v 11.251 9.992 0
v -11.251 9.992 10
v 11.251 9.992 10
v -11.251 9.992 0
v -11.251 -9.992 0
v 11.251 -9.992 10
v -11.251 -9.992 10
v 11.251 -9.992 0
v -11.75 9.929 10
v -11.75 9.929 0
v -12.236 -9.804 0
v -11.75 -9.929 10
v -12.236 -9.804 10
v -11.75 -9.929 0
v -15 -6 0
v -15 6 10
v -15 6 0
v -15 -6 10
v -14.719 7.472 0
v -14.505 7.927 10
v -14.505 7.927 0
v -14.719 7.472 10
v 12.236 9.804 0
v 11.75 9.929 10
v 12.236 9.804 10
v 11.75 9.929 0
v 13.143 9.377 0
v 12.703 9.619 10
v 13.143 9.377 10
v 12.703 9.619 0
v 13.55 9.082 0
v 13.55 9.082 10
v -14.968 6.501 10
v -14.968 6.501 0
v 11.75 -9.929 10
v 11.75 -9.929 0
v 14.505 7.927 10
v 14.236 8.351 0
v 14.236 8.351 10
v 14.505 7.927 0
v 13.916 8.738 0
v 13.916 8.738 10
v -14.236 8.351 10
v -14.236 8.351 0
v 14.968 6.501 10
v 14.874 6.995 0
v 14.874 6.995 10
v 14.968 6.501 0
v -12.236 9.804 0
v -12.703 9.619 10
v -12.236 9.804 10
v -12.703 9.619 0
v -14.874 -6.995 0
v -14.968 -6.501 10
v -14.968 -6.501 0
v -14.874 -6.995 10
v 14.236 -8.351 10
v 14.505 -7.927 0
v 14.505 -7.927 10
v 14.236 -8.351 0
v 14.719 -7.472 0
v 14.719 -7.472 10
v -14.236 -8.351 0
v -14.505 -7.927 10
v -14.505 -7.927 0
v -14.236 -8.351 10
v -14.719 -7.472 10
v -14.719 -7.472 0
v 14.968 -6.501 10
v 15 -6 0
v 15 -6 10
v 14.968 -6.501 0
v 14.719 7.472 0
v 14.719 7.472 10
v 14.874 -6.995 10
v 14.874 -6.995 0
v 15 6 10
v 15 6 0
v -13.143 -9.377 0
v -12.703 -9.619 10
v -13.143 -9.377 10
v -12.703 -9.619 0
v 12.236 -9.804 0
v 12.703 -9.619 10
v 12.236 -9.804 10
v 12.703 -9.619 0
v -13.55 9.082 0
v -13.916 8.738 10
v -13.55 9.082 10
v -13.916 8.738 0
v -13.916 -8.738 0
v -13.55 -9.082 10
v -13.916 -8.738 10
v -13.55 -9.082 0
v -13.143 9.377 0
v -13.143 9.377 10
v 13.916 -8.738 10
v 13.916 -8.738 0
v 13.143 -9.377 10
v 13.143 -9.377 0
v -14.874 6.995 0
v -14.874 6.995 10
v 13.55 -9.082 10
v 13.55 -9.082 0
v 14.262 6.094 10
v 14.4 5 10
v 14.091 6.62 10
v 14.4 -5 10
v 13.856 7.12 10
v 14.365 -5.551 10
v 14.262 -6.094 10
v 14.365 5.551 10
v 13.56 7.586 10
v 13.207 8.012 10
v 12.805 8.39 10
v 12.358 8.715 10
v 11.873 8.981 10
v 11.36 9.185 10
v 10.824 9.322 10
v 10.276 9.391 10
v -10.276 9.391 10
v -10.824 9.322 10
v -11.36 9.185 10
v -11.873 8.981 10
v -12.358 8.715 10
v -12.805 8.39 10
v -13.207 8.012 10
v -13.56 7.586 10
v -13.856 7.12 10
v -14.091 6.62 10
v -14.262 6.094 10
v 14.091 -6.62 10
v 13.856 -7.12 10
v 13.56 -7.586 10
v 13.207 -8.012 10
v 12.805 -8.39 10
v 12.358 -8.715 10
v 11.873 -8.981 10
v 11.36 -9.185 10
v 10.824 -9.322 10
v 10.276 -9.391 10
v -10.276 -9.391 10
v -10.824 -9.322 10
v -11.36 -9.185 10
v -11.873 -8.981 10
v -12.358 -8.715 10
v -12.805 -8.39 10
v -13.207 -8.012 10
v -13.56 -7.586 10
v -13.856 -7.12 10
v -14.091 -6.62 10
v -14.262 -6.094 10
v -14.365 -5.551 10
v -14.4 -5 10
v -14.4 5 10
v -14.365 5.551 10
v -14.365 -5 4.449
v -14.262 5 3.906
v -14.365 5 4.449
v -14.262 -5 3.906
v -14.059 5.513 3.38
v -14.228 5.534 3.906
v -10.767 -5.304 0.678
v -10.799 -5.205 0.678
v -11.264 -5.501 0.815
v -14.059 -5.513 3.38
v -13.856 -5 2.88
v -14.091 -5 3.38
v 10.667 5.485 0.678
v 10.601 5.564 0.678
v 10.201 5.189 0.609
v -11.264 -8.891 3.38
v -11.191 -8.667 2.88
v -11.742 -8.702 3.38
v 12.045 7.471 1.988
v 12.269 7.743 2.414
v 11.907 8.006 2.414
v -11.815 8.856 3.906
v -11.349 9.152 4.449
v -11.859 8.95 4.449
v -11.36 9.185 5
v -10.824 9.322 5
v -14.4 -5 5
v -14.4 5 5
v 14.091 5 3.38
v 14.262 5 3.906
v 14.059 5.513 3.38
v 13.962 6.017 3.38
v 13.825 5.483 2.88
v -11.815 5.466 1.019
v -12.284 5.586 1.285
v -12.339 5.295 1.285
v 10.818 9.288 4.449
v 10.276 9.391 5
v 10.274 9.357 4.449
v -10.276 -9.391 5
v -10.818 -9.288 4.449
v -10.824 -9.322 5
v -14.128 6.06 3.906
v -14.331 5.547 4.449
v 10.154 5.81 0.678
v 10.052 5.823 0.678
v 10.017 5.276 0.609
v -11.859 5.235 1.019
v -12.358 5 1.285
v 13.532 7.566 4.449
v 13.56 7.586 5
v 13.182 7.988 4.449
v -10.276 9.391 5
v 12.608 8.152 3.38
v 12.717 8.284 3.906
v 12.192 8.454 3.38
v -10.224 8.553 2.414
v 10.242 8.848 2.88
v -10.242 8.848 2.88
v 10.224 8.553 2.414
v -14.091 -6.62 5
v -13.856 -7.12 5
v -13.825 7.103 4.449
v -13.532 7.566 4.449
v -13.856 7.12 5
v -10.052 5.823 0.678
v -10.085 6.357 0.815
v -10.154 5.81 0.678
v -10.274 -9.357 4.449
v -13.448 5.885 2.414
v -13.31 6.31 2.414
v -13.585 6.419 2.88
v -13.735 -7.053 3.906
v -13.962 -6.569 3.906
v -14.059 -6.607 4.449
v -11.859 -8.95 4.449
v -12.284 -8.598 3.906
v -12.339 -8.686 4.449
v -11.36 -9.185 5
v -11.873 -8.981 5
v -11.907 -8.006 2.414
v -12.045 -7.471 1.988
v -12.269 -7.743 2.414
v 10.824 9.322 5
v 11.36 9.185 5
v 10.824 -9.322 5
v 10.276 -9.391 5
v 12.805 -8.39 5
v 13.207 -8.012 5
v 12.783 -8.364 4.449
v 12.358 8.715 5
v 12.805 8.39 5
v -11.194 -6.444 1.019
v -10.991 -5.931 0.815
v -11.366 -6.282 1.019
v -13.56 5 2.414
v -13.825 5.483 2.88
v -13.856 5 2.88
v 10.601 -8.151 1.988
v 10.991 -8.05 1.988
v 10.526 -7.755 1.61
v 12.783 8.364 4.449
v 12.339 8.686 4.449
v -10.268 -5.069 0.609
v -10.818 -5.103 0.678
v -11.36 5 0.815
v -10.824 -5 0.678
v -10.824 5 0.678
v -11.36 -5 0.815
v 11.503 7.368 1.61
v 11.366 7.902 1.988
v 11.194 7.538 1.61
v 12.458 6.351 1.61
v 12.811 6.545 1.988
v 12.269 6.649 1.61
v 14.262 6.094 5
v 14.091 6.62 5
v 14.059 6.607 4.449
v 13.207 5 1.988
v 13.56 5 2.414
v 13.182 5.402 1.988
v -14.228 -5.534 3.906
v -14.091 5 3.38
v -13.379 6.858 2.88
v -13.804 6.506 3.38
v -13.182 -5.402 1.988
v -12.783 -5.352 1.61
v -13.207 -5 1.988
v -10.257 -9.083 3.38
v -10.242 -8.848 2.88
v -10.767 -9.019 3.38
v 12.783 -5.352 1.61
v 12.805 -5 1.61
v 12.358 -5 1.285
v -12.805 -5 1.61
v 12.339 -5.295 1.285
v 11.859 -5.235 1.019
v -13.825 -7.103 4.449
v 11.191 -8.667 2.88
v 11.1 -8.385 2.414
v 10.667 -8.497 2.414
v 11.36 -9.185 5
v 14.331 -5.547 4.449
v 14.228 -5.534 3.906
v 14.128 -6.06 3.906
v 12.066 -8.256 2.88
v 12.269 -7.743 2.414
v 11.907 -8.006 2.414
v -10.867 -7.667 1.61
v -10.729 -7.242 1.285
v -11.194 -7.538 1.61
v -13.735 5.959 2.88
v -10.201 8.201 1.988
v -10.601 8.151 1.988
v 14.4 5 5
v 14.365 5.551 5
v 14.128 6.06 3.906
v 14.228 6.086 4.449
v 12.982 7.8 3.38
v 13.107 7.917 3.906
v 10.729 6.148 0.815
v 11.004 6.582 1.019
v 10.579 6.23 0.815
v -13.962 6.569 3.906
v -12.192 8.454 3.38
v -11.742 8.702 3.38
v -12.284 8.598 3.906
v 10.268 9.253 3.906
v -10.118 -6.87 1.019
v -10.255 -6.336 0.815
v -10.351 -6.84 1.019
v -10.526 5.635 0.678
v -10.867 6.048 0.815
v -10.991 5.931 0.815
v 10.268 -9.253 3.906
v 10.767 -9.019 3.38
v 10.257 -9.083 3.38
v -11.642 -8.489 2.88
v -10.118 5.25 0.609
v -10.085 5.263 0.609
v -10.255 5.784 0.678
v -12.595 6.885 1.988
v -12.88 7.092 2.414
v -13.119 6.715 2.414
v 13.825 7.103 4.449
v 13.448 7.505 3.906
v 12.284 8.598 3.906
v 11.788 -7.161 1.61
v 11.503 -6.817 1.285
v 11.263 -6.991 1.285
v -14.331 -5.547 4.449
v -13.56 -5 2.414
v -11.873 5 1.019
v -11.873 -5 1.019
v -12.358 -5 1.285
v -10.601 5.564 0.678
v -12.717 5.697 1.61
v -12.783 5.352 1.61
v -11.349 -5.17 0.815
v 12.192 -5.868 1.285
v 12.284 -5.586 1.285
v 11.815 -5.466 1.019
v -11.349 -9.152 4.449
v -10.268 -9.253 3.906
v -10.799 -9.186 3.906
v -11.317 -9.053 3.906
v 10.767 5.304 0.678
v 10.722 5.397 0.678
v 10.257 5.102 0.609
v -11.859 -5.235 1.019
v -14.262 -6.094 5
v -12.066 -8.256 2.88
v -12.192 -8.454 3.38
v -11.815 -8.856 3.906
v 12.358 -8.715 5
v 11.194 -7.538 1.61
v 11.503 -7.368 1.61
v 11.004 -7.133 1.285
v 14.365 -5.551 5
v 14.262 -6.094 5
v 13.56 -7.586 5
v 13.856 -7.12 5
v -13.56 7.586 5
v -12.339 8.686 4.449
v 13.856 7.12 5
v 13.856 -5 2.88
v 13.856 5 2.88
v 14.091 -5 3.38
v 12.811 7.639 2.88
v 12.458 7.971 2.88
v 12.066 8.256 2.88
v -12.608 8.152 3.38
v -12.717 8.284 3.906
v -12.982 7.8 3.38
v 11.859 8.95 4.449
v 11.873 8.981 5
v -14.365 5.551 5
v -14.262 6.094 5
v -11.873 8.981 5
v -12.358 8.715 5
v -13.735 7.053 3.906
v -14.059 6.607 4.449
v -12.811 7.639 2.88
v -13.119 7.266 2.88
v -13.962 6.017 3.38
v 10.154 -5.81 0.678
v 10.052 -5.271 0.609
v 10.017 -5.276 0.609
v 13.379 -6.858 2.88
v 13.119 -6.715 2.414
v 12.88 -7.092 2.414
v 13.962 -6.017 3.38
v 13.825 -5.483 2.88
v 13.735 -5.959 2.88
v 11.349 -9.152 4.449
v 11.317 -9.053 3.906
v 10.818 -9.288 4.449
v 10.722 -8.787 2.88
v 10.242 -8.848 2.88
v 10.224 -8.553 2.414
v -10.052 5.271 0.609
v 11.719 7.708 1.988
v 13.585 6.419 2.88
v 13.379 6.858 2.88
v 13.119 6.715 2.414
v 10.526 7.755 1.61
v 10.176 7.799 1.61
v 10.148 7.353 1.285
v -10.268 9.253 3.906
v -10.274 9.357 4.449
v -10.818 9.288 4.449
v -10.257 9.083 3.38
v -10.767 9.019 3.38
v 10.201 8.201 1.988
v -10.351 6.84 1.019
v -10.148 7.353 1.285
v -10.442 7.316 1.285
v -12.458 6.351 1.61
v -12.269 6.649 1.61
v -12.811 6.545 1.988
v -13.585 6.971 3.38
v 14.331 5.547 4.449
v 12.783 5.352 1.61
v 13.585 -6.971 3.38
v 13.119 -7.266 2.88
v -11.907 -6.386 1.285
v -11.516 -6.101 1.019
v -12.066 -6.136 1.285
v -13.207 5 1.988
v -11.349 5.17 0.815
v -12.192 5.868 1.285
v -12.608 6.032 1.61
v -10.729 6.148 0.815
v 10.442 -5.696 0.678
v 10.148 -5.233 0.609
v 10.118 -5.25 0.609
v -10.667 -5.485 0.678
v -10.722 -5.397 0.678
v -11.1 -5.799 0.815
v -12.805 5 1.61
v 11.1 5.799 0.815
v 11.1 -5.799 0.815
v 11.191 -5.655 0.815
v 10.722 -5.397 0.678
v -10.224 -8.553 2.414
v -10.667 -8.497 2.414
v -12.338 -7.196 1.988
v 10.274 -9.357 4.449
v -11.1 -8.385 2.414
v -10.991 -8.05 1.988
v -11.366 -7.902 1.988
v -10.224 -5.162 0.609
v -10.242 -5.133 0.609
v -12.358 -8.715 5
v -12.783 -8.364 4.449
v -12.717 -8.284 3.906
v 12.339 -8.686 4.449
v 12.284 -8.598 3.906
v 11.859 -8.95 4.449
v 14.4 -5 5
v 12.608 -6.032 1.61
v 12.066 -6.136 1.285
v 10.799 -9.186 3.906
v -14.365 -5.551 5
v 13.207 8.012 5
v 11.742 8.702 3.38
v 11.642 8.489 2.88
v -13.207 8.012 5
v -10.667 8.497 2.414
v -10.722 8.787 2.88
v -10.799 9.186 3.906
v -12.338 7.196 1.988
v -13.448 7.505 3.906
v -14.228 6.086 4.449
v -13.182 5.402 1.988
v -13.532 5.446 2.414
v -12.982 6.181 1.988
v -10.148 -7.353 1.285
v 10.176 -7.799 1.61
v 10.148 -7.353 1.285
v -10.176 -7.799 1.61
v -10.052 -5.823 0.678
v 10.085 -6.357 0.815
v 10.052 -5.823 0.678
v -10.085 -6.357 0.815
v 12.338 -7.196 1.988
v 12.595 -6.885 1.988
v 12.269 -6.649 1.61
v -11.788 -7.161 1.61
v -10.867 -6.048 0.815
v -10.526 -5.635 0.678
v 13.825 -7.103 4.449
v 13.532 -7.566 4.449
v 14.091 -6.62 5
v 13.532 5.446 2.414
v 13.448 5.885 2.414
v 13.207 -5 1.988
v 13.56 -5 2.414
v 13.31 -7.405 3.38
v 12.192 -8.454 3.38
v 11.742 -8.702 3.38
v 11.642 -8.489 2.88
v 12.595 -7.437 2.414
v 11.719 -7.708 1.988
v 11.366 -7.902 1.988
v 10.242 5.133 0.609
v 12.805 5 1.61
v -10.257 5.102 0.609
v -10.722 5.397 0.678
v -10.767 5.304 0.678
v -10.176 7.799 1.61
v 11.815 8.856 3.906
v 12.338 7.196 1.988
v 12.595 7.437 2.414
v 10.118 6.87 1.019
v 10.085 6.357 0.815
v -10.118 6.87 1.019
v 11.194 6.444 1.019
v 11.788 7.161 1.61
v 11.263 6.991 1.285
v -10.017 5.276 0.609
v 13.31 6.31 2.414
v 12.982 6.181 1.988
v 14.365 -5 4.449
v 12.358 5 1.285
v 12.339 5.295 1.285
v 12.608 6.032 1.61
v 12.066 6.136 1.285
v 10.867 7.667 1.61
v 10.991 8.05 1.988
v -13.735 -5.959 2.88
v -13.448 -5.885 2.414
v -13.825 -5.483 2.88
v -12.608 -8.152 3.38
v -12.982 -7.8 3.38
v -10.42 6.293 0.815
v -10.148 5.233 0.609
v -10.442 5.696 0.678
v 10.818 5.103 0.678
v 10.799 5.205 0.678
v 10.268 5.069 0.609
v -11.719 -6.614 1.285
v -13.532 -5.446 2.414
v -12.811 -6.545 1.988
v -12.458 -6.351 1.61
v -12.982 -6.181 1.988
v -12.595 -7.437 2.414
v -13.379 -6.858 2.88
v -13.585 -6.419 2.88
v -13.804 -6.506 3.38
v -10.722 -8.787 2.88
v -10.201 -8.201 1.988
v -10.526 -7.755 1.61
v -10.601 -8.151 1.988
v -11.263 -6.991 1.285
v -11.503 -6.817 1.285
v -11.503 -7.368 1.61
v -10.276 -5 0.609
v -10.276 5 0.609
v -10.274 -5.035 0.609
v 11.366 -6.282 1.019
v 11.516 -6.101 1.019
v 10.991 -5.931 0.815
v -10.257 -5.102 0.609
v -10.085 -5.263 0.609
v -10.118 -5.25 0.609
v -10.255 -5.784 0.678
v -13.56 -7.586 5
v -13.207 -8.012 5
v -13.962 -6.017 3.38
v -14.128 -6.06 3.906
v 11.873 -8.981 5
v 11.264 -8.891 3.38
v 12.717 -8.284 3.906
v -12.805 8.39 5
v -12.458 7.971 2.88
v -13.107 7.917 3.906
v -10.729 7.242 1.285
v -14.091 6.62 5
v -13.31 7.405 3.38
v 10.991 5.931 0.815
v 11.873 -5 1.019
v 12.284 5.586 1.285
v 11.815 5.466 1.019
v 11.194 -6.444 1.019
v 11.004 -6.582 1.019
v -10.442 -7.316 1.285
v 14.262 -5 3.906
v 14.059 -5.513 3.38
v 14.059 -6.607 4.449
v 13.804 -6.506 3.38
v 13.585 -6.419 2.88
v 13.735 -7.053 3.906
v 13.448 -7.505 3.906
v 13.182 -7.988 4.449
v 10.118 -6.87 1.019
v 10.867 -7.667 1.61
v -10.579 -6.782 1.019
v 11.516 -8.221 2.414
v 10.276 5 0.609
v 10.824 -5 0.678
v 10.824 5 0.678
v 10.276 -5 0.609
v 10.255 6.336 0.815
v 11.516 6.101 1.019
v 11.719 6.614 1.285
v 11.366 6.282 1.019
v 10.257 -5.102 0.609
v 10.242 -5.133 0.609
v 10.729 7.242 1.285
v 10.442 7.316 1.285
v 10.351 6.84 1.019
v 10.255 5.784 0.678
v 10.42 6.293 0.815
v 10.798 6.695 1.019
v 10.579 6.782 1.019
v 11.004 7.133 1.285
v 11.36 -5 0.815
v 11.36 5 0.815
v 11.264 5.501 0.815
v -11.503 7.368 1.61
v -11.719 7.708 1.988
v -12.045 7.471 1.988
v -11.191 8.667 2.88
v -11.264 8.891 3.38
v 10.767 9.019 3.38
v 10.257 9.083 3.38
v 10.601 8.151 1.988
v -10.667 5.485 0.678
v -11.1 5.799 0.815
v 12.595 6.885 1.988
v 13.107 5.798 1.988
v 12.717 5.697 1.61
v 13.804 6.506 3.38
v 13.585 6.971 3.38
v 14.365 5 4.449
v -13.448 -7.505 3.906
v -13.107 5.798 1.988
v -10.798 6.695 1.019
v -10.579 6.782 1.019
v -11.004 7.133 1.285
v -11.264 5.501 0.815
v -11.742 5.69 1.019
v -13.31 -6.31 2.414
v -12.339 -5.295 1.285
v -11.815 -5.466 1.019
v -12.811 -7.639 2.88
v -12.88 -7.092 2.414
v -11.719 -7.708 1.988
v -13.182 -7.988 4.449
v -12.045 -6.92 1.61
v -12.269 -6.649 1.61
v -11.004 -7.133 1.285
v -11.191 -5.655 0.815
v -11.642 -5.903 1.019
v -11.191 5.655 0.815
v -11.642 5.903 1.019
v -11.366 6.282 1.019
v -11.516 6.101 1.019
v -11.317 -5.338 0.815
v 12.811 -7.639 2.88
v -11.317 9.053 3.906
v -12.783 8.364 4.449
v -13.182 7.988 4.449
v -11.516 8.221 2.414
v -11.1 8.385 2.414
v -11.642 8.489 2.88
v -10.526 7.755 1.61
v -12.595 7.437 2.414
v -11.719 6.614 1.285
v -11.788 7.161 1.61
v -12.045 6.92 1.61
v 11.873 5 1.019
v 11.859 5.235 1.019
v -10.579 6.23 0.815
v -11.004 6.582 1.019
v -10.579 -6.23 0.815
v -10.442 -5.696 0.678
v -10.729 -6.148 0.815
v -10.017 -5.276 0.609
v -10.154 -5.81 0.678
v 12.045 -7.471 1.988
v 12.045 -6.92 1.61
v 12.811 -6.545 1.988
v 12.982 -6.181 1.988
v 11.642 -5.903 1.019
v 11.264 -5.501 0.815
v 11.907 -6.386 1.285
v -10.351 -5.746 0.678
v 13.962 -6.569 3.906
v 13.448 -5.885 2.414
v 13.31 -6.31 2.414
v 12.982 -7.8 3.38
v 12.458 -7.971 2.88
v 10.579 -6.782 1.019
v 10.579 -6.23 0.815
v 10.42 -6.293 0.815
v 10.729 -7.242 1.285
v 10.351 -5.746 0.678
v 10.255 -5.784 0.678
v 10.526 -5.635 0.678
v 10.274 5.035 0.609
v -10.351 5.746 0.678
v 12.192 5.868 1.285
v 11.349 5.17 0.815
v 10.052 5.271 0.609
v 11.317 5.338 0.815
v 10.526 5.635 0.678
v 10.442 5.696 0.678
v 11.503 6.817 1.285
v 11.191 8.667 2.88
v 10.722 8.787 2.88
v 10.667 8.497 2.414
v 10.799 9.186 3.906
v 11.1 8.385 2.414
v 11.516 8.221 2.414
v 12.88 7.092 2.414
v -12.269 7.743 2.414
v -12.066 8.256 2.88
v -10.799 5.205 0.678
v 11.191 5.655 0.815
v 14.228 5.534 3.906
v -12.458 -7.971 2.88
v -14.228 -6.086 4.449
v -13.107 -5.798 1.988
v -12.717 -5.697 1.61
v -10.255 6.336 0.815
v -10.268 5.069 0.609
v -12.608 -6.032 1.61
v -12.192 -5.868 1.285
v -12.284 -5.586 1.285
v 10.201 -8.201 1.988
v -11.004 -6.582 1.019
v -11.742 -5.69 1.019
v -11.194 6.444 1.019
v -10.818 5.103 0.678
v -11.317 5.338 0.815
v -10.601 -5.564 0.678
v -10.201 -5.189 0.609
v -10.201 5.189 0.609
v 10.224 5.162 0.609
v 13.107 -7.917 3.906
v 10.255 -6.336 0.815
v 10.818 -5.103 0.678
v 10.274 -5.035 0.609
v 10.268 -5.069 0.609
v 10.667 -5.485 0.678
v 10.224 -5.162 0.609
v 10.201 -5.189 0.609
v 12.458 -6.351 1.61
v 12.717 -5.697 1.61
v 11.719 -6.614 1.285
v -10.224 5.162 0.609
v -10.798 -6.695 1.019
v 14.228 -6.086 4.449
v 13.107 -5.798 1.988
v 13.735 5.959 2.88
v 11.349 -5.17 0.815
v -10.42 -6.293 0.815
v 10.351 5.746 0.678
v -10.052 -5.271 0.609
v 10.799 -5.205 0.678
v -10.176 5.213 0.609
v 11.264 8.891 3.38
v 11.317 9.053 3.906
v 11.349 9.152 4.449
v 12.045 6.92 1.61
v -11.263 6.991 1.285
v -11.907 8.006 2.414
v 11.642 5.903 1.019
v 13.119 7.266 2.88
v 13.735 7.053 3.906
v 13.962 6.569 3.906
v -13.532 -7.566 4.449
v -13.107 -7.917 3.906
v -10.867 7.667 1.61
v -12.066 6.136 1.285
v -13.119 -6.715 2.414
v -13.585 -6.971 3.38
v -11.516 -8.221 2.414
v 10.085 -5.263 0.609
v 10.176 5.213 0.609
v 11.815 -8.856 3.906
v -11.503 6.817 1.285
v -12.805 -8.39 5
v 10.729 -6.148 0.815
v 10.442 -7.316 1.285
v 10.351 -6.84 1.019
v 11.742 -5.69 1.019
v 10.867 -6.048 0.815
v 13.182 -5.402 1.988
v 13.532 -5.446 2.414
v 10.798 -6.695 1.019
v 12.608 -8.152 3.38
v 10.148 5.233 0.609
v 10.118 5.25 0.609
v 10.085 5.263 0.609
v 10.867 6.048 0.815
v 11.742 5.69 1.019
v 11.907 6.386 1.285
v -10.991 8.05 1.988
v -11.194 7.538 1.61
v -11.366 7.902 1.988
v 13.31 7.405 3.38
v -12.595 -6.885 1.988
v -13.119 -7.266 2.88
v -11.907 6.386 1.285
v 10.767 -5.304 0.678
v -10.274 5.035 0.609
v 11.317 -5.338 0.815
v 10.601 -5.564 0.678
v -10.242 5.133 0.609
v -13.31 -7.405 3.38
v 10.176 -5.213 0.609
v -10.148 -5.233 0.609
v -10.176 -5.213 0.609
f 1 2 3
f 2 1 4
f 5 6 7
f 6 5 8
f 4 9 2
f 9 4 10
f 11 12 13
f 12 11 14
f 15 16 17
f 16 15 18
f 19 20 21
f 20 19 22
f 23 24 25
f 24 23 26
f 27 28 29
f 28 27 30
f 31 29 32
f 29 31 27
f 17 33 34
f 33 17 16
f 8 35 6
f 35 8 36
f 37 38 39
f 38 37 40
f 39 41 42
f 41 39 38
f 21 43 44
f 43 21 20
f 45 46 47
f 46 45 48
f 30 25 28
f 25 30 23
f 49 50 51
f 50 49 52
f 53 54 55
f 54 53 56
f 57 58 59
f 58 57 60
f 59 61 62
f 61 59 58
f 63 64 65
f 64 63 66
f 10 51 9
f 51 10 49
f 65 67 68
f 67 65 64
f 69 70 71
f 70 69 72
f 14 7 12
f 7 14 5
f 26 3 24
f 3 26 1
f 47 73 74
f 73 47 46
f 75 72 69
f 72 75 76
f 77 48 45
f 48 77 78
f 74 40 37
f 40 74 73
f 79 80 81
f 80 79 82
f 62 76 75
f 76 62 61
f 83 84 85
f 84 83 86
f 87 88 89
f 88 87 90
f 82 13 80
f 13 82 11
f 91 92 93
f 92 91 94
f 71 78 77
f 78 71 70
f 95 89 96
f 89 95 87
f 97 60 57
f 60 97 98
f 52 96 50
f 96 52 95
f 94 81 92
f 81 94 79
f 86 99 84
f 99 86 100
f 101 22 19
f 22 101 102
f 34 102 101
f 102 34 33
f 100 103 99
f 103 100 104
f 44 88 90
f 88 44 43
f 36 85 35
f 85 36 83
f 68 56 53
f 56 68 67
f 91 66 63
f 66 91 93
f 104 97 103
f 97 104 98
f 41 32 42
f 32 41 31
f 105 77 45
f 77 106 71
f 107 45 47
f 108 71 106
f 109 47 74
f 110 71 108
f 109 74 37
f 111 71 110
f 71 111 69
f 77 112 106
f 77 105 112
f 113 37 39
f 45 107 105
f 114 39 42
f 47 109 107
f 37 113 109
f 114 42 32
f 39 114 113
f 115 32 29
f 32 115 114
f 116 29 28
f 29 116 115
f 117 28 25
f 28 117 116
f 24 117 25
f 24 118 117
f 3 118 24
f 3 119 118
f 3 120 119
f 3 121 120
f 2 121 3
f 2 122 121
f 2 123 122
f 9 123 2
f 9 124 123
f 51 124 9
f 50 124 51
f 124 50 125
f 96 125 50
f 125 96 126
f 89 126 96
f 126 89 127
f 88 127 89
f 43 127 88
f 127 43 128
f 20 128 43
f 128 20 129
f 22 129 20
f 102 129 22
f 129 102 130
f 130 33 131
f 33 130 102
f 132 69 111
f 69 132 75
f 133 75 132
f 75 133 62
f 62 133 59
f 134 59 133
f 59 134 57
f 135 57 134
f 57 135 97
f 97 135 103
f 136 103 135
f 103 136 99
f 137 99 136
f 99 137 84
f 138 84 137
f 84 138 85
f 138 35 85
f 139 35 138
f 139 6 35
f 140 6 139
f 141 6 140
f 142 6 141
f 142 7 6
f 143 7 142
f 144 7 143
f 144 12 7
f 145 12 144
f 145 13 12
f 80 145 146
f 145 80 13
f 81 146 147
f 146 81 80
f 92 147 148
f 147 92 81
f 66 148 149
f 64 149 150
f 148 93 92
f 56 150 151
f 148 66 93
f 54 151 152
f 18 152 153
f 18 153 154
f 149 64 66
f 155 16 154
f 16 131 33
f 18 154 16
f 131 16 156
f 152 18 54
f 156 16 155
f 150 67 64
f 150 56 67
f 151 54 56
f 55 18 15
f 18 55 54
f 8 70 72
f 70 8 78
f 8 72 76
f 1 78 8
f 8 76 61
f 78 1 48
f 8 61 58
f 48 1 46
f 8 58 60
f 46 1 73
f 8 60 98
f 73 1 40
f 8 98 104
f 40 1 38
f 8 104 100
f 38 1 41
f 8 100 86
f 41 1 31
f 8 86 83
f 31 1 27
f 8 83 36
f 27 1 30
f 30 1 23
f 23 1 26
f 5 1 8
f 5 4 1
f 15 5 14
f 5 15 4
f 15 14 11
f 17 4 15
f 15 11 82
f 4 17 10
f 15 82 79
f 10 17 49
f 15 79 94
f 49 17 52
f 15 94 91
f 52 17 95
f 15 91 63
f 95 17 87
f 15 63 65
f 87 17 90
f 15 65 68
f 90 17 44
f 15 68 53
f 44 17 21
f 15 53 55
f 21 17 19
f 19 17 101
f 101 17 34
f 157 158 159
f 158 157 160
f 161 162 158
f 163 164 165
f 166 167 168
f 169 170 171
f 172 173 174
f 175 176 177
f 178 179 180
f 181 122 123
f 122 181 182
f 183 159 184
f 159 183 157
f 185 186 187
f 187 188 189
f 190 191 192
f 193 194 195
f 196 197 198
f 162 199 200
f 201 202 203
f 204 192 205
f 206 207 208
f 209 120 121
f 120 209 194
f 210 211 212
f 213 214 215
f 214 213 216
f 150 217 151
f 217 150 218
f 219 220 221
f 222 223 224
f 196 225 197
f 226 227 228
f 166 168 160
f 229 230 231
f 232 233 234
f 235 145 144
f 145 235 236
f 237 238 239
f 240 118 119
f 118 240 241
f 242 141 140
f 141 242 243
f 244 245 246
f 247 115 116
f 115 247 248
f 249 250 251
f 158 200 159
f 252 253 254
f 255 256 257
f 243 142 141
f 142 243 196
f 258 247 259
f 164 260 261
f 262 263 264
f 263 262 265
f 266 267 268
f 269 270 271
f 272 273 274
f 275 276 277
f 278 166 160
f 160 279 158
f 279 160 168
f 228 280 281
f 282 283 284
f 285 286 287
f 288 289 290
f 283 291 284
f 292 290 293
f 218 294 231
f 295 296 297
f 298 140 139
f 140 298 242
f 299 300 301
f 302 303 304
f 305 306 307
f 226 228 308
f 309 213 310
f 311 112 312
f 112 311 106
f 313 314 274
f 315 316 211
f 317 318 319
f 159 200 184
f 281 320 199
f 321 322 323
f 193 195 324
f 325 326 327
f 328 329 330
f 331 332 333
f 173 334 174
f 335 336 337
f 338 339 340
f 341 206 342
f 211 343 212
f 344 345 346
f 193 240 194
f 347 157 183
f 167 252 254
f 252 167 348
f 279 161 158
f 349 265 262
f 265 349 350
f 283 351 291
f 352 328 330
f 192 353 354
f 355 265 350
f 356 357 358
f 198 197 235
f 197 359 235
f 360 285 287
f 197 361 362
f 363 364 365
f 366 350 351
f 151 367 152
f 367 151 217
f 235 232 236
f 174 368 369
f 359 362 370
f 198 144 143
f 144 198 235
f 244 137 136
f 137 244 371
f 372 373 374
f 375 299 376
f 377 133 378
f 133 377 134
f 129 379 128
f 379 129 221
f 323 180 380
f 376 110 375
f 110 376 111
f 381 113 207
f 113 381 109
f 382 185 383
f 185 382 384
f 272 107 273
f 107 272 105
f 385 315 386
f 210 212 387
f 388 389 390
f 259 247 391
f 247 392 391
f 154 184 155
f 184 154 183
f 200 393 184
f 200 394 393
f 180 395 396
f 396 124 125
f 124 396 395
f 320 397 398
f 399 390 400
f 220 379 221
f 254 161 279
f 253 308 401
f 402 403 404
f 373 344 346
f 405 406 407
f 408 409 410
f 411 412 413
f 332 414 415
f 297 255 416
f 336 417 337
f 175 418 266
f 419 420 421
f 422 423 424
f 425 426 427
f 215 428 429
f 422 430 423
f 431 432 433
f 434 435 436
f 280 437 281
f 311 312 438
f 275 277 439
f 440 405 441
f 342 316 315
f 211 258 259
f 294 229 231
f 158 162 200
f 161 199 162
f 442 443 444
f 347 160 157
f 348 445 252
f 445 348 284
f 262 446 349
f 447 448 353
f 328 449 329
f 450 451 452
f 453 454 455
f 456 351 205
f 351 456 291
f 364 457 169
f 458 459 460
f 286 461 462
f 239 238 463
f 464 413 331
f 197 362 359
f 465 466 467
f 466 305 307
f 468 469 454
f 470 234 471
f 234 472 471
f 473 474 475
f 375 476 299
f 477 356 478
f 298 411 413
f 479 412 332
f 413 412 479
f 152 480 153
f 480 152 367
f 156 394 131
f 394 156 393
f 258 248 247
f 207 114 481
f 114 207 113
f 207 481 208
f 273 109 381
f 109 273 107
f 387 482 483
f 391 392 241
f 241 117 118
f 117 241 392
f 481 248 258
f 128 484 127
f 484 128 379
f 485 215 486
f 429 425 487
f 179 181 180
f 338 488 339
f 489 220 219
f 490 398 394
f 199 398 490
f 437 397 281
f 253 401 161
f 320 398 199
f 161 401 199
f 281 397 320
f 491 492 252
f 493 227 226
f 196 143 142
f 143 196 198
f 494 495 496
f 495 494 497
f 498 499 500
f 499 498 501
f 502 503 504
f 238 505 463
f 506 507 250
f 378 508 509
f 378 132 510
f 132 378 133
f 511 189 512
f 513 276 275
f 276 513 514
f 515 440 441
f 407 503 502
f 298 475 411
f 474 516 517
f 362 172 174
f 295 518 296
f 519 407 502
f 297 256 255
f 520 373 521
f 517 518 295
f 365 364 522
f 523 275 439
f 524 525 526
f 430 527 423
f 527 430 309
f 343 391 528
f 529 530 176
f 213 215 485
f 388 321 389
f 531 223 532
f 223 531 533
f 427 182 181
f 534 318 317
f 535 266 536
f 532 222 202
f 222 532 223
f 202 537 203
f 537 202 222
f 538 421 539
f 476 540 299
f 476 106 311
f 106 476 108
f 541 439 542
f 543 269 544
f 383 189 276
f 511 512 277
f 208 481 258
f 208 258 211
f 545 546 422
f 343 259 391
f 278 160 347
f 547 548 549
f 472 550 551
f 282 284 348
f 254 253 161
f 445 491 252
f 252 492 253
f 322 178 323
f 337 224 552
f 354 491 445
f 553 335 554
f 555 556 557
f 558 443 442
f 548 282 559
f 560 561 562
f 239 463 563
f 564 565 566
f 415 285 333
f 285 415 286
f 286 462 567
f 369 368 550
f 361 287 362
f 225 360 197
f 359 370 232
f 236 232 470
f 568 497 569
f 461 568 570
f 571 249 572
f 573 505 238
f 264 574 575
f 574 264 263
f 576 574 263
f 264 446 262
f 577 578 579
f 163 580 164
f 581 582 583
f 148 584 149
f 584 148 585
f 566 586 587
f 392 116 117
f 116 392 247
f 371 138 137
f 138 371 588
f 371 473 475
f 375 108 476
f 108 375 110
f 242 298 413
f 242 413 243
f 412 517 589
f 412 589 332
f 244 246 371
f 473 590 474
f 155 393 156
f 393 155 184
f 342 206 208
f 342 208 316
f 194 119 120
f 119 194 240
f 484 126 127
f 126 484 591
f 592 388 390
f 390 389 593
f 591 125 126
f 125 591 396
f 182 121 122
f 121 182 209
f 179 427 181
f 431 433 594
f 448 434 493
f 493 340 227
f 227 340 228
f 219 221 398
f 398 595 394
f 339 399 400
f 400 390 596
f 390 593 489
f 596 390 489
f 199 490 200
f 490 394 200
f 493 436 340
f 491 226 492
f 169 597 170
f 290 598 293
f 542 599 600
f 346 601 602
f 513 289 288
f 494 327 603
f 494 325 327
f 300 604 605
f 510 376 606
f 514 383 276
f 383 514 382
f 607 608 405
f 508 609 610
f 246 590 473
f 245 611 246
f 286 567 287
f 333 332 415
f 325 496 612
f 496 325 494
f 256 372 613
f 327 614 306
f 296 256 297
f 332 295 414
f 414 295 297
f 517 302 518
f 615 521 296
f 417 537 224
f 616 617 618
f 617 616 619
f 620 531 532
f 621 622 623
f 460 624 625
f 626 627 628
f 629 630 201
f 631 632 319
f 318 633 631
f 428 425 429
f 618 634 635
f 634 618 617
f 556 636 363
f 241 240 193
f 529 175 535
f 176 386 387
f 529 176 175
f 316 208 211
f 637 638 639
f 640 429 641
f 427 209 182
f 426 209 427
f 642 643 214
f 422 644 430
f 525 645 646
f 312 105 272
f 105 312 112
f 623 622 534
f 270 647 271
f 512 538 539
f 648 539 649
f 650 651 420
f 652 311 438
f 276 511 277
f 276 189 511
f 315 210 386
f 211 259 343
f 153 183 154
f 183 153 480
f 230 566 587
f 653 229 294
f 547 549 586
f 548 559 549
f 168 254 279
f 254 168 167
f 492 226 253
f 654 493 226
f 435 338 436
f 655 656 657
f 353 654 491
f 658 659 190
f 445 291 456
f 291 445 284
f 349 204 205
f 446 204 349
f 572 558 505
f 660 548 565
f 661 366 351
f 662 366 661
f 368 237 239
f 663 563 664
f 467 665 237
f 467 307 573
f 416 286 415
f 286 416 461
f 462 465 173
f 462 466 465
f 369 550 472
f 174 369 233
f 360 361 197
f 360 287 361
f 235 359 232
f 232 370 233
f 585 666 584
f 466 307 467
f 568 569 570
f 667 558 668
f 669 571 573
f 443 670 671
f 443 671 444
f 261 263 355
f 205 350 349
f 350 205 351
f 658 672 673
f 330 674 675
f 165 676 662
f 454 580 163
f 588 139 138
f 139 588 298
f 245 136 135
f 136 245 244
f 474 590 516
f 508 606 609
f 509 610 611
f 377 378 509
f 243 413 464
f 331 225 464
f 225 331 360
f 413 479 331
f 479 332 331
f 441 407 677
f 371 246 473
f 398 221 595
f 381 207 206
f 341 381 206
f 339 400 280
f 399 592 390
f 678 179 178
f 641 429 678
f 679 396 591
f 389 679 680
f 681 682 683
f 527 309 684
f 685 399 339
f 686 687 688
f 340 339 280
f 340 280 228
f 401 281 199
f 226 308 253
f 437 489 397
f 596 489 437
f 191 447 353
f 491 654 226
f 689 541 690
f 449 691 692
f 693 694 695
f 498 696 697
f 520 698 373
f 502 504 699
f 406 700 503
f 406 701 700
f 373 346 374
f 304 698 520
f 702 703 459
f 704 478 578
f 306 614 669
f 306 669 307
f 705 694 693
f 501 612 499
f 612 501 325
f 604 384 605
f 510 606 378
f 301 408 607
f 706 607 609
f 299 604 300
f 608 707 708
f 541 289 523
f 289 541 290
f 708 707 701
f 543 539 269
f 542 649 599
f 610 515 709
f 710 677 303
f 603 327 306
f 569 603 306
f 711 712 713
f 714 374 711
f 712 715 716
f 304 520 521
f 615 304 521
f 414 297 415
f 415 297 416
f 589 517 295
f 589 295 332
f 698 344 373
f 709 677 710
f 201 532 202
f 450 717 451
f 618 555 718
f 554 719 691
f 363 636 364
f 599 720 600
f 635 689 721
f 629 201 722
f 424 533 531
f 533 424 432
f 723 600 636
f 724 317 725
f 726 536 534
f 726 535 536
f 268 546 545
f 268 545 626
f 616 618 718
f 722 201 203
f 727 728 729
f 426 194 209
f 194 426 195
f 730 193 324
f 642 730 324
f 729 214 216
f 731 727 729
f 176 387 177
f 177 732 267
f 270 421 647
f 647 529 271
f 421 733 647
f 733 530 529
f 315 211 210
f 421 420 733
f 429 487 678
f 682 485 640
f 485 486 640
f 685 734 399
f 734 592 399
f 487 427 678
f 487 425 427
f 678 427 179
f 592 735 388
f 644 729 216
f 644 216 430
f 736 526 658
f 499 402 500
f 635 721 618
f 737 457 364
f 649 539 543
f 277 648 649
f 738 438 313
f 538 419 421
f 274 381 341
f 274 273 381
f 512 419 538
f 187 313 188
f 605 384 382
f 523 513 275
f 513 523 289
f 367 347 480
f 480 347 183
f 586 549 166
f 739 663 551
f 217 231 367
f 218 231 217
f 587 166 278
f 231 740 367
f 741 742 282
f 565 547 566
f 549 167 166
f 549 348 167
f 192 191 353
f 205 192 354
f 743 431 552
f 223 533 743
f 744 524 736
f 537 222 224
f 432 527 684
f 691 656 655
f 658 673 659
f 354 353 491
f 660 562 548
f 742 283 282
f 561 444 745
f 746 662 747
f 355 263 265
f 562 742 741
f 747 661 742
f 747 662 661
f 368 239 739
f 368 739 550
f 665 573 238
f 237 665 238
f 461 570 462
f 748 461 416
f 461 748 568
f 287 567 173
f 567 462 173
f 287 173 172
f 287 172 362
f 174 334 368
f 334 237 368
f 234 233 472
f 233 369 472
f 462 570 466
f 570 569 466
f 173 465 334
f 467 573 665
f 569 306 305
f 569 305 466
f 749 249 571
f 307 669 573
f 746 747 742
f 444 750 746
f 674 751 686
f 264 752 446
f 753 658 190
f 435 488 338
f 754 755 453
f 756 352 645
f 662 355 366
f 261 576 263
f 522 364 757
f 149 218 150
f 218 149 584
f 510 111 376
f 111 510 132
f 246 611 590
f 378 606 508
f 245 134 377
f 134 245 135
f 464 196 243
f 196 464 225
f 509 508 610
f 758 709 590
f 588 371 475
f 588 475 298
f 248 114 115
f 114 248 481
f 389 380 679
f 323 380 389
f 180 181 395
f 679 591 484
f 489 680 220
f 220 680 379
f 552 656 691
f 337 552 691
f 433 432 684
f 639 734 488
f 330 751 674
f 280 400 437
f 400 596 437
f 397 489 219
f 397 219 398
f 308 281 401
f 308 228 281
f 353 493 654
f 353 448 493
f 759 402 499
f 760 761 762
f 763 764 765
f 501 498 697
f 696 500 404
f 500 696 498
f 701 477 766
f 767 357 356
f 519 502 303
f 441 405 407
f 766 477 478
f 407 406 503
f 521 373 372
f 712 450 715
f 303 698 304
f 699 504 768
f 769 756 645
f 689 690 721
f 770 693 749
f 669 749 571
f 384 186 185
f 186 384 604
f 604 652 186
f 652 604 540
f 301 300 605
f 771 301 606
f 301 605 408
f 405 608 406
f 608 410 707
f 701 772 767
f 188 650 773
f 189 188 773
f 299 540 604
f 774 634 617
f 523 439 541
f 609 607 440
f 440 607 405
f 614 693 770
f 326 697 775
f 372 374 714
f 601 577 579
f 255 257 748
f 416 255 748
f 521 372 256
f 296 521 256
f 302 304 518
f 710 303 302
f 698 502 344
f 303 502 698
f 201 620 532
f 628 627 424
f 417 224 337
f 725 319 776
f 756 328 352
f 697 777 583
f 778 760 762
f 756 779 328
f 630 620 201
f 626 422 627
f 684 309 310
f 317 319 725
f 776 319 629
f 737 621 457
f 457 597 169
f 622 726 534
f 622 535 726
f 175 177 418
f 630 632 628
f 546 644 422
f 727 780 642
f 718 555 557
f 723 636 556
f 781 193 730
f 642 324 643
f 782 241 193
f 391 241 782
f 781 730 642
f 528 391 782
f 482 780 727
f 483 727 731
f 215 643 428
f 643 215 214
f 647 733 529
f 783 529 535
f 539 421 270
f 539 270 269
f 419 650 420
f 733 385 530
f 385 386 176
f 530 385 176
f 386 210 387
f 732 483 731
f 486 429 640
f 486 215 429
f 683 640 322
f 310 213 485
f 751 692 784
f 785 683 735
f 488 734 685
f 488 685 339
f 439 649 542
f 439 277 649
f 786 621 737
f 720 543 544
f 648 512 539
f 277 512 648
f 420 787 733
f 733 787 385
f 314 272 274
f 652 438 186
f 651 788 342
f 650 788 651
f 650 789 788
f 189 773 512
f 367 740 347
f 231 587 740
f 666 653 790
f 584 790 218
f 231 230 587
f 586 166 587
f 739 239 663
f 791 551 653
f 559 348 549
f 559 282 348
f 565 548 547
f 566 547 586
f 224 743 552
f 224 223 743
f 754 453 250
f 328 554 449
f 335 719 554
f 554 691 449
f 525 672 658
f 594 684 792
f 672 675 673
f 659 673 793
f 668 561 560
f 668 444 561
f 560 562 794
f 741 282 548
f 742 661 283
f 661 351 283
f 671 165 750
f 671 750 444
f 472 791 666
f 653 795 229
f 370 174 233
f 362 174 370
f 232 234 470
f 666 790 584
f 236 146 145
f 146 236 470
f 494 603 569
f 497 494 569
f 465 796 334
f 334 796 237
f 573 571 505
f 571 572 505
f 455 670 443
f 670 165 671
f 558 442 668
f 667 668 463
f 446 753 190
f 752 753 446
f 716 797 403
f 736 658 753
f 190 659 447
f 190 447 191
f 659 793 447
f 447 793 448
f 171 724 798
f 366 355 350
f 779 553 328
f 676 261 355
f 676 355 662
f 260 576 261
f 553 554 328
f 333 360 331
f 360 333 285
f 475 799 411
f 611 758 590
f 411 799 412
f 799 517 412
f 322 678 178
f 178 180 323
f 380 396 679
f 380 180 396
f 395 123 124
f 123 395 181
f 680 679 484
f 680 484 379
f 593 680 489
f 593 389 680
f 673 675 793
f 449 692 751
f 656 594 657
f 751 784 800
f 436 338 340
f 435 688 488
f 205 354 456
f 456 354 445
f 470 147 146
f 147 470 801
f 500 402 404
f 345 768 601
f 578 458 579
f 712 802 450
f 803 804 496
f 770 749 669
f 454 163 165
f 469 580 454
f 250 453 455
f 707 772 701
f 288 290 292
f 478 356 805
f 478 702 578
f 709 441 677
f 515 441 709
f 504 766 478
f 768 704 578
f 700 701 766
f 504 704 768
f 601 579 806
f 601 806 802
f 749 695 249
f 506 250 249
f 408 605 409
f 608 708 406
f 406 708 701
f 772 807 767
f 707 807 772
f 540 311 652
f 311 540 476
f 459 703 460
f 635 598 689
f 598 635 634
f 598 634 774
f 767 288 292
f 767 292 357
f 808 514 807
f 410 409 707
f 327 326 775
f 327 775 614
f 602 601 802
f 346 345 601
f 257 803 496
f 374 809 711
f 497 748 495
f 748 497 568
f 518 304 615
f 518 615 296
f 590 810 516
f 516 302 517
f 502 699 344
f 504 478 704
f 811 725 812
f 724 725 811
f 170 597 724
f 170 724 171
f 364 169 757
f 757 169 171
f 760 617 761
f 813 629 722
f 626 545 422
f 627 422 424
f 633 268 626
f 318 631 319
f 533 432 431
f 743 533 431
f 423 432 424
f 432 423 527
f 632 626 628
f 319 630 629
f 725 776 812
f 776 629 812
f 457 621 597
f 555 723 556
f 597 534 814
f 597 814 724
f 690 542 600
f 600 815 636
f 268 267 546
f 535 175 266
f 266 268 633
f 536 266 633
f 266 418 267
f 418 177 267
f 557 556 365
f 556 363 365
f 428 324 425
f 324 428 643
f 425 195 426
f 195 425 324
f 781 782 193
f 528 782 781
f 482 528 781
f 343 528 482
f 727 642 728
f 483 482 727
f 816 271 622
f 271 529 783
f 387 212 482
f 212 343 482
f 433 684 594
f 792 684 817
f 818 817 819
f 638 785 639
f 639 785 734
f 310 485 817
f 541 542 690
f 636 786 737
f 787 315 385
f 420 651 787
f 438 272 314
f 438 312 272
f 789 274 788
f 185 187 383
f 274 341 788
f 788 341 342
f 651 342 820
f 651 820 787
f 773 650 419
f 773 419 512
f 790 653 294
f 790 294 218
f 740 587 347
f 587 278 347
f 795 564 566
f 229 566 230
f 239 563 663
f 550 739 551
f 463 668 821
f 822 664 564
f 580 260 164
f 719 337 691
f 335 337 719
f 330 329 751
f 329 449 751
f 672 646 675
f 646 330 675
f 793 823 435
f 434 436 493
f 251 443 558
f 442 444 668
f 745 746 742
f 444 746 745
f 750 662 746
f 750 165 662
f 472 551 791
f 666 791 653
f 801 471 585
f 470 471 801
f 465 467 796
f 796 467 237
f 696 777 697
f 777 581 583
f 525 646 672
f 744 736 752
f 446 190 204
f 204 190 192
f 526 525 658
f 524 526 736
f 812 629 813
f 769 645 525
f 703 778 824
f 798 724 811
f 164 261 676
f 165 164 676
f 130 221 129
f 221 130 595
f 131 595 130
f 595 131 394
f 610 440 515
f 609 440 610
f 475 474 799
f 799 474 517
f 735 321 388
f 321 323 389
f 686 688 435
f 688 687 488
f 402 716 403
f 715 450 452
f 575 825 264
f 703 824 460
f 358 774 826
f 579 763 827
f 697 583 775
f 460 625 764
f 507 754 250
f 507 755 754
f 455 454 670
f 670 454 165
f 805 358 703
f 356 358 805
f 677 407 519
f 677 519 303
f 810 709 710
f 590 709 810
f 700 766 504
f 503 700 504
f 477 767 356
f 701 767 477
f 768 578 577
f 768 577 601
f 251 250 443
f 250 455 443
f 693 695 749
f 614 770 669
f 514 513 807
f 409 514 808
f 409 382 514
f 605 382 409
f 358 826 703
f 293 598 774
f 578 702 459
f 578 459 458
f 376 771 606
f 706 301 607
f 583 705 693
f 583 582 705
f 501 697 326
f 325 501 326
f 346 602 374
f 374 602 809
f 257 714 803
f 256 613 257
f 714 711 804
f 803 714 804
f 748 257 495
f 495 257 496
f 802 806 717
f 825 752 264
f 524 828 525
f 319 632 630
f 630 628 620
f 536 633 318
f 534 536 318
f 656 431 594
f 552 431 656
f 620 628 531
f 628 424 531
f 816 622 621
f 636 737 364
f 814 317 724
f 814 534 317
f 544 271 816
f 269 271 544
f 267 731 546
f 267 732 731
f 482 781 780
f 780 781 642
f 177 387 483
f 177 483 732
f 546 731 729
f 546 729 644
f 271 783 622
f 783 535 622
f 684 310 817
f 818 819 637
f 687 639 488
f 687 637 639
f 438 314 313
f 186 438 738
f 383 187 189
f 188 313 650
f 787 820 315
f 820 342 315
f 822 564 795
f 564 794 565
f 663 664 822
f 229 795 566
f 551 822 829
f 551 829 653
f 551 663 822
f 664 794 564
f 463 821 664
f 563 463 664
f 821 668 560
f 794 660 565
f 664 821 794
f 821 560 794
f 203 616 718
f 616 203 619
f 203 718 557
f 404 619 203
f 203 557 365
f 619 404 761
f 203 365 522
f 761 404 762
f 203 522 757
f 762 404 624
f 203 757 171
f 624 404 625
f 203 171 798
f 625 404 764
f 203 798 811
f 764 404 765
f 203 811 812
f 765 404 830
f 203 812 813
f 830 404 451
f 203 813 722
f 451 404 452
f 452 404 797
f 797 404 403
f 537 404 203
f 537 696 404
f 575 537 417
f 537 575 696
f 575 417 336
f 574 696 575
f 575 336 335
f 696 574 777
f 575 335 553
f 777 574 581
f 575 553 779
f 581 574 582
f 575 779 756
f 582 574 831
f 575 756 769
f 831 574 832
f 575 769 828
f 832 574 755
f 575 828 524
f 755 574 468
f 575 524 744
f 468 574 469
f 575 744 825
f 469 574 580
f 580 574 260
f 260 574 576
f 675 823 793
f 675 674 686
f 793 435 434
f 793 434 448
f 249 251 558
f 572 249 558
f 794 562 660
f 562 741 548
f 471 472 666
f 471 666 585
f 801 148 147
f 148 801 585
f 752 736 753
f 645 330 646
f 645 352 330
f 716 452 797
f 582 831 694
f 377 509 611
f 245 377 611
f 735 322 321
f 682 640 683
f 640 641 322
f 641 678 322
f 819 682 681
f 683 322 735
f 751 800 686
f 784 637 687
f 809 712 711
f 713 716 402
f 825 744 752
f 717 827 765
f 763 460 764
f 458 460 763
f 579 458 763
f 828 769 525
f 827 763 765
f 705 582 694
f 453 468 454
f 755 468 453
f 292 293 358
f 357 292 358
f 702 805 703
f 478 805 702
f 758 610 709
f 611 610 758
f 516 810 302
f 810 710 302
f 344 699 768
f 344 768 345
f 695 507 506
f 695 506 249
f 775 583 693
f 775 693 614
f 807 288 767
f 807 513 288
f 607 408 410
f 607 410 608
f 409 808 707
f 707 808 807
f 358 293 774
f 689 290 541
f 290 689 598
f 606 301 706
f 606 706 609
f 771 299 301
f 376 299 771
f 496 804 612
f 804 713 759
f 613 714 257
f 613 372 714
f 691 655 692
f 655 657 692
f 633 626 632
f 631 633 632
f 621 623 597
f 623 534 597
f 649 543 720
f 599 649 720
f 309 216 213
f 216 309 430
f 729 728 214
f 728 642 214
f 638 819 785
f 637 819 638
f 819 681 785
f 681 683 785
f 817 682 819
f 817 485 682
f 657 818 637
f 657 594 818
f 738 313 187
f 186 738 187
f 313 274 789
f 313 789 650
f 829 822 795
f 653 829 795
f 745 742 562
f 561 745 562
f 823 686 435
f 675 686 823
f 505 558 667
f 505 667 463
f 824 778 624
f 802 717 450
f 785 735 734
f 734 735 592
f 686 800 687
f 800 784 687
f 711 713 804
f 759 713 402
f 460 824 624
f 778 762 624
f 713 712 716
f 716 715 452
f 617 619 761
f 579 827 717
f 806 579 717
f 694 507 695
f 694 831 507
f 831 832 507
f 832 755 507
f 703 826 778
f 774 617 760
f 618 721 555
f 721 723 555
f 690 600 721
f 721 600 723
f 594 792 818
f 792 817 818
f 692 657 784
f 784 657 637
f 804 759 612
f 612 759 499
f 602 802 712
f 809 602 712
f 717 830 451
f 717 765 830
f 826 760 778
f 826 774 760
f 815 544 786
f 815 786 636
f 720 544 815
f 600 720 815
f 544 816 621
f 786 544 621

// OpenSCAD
$fn = 50;

difference() {
	union() {
		difference() {
			hull() {
				translate(v = [-11.0, 6.0, 0]) {
					cylinder(h = 10, r = 4);
				}
				translate(v = [11.0, 6.0, 0]) {
					cylinder(h = 10, r = 4);
				}
				translate(v = [-11.0, -6.0, 0]) {
					cylinder(h = 10, r = 4);
				}
				translate(v = [11.0, -6.0, 0]) {
					cylinder(h = 10, r = 4);
				}
			}
			translate(v = [0, 0, 0.6]) {
				hull() {
					union() {
						translate(v = [-10.0, 5.0, 4.4]) {
							cylinder(h = 101.2, r = 4.4);
						}
						translate(v = [-10.0, 5.0, 4.4]) {
							sphere(r = 4.4);
						}
						translate(v = [-10.0, 5.0, 105.6]) {
							sphere(r = 4.4);
						}
					}
					union() {
						translate(v = [10.0, 5.0, 4.4]) {
							cylinder(h = 101.2, r = 4.4);
						}
						translate(v = [10.0, 5.0, 4.4]) {
							sphere(r = 4.4);
						}
						translate(v = [10.0, 5.0, 105.6]) {
							sphere(r = 4.4);
						}
					}
					union() {
						translate(v = [-10.0, -5.0, 4.4]) {
							cylinder(h = 101.2, r = 4.4);
						}
						translate(v = [-10.0, -5.0, 4.4]) {
							sphere(r = 4.4);
						}
						translate(v = [-10.0, -5.0, 105.6]) {
							sphere(r = 4.4);
						}
					}
					union() {
						translate(v = [10.0, -5.0, 4.4]) {
							cylinder(h = 101.2, r = 4.4);
						}
						translate(v = [10.0, -5.0, 4.4]) {
							sphere(r = 4.4);
						}
						translate(v = [10.0, -5.0, 105.6]) {
							sphere(r = 4.4);
						}
					}
				}
			}
		}
	}
	union();
}
